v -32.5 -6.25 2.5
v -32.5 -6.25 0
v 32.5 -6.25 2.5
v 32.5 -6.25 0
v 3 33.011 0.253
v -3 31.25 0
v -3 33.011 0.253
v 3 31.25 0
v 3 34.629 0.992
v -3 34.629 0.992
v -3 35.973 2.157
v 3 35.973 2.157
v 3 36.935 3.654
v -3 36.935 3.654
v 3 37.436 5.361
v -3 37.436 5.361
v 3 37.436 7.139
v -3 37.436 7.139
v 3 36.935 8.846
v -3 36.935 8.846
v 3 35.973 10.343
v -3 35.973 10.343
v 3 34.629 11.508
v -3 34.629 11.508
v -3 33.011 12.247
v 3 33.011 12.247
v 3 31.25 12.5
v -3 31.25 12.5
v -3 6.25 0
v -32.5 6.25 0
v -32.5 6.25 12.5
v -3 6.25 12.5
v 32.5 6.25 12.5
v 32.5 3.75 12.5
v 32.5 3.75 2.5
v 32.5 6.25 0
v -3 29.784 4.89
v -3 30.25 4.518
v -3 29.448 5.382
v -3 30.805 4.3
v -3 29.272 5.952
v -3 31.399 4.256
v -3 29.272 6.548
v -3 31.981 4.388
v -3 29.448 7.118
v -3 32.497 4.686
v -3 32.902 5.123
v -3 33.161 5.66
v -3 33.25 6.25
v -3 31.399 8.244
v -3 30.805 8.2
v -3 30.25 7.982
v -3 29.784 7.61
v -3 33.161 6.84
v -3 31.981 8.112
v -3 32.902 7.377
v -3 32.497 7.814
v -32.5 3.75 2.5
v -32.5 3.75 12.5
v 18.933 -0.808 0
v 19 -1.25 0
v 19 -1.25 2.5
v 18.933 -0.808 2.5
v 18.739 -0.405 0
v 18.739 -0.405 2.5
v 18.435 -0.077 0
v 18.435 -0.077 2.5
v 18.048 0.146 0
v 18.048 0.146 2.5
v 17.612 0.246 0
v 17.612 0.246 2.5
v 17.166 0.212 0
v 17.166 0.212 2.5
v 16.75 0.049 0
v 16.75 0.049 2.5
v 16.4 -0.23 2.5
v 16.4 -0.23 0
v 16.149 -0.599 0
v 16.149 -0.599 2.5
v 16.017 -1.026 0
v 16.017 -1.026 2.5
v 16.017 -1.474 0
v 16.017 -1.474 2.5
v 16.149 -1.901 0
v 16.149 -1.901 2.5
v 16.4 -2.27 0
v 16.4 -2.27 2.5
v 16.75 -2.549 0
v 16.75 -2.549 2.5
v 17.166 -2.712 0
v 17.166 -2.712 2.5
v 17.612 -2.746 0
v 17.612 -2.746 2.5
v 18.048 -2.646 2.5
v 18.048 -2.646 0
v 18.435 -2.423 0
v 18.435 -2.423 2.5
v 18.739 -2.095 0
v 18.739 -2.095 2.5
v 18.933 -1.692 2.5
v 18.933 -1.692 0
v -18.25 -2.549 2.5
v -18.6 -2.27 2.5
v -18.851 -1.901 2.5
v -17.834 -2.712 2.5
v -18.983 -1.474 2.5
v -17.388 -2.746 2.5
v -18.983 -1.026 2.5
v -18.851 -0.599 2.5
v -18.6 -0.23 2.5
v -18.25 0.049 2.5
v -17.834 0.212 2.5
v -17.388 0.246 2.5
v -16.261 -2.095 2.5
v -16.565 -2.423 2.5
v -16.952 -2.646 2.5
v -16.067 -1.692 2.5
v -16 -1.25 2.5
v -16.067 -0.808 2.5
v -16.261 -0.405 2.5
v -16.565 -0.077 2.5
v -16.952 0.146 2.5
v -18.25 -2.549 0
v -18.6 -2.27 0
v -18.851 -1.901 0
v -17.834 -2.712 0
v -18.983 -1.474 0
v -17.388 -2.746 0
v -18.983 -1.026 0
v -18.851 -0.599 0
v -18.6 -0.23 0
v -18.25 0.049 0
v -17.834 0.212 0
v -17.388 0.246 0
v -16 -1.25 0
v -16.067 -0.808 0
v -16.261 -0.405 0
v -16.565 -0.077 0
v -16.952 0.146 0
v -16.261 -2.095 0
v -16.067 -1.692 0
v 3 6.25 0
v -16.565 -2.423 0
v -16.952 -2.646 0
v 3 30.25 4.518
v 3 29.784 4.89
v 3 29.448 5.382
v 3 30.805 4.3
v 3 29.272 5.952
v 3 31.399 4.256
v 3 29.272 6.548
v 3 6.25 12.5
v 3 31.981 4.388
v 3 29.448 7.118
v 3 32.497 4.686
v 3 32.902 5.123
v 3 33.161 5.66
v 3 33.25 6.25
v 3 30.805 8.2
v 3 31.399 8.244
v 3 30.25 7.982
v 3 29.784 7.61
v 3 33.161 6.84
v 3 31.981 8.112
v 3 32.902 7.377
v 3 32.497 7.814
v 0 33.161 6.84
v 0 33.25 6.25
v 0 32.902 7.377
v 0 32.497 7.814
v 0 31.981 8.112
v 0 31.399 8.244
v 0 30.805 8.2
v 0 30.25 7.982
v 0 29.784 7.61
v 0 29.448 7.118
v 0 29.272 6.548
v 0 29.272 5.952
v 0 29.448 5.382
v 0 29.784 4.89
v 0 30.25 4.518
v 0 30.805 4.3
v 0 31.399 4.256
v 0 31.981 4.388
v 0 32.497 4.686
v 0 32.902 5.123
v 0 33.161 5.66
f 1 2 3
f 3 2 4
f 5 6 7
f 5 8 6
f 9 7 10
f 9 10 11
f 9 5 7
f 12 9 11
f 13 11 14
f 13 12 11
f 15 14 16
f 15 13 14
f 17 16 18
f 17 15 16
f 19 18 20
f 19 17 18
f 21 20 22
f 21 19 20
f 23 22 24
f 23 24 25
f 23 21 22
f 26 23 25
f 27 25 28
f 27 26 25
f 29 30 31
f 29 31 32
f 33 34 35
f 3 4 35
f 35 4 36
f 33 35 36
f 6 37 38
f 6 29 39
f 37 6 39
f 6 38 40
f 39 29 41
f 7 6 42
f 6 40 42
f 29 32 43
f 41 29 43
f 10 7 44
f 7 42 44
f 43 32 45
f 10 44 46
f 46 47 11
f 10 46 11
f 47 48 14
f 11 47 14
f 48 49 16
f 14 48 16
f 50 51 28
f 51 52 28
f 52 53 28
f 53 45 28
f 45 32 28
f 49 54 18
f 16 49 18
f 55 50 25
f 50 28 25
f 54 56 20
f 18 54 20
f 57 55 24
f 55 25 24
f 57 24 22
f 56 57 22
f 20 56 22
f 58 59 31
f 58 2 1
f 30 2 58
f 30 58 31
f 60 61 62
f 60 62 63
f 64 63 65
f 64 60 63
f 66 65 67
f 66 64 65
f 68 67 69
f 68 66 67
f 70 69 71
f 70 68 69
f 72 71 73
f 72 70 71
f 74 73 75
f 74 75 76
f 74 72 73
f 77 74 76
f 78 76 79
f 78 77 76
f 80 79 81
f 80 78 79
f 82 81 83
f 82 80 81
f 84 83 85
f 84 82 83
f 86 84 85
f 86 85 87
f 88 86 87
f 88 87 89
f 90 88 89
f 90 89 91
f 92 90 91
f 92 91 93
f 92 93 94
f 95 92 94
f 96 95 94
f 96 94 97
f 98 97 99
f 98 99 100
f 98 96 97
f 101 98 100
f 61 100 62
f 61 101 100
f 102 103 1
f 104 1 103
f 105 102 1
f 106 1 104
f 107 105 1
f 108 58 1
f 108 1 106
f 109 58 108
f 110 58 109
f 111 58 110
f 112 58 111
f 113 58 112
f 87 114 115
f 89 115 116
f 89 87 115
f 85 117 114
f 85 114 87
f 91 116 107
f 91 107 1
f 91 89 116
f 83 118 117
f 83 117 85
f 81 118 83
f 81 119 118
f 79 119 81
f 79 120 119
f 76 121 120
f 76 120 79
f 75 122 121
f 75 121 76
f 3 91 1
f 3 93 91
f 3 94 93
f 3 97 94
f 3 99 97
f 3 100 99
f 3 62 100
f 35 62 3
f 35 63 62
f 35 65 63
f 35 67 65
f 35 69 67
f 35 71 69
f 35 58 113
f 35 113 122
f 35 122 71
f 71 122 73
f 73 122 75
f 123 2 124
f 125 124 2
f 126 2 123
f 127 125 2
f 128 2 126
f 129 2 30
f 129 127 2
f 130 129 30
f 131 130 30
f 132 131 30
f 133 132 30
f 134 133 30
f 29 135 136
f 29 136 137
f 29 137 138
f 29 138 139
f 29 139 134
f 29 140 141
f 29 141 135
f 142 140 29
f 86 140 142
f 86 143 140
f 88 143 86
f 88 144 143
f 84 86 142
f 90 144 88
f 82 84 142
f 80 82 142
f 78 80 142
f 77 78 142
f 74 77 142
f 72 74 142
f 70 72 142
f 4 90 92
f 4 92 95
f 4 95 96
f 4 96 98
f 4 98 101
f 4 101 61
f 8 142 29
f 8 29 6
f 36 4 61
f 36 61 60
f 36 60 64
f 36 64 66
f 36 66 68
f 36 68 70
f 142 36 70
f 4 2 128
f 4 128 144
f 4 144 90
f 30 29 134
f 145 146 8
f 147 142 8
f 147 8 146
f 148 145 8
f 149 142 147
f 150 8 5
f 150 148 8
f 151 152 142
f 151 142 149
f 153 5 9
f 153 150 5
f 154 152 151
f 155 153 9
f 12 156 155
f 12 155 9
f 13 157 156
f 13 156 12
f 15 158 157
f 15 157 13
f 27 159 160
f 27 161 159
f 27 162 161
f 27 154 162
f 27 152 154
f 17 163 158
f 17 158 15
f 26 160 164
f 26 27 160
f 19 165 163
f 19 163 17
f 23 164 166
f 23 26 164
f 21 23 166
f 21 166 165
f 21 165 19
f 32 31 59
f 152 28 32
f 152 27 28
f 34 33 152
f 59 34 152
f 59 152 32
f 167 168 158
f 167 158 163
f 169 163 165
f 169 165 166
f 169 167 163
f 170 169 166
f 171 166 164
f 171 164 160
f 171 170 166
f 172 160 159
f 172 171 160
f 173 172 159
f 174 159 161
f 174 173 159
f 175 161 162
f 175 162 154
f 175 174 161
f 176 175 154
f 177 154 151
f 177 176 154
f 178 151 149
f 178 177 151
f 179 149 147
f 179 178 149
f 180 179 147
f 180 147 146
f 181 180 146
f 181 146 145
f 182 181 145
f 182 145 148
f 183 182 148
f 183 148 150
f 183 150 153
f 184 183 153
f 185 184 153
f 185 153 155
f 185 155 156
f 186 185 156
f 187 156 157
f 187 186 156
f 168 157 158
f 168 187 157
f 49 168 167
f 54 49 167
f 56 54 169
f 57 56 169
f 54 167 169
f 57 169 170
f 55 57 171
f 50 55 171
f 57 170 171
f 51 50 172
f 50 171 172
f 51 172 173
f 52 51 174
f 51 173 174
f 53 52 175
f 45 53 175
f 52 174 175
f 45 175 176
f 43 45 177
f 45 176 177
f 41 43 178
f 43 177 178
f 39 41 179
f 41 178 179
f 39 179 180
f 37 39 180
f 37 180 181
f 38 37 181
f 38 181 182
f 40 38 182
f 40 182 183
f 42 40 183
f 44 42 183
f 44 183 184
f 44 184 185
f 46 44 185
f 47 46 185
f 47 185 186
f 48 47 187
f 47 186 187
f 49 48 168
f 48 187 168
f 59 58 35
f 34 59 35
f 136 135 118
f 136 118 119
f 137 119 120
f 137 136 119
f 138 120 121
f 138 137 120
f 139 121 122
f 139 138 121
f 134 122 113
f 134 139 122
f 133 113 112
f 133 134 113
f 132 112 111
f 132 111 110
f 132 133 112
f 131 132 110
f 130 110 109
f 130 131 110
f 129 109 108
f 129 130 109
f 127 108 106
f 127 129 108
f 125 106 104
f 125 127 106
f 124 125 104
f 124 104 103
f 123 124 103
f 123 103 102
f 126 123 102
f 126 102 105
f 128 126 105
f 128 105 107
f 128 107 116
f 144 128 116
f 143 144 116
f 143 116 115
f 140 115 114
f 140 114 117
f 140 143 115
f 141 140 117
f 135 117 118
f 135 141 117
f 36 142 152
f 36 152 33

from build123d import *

# Parameters (mm, degrees)
F0_W          = 65
F0_H          = 12.5
F0_R          = 1.5
F1_DEPTH      = 2.5
F2_W          = 65
F2_H          = 2.5
F3_DEPTH      = 10
F4_R          = 2
F5_DEPTH      = 3
F5_DEPTH_BACK = 3


with BuildPart() as f1:
    # F0 (on Top) → F1 (new body)
    with BuildSketch(Plane.XY):
        Rectangle(F0_W, F0_H)
        with Locations((-17.5, -1.25)):
            Circle(F0_R, mode=Mode.SUBTRACT)
        with Locations((17.5, -1.25)):
            Circle(F0_R, mode=Mode.SUBTRACT)
    extrude(amount=F1_DEPTH)

    # F2 (on face) → F3 (join)
    with BuildSketch(Plane.XY.offset(2.5)):
        with Locations((0, 5)):
            Rectangle(F2_W, F2_H)
    extrude(amount=F3_DEPTH)

    # F4 (on Right) → F5 (join, two sides)
    with BuildSketch(Plane.YZ) as f5_sk:
        with BuildLine():
            Line((6.25, 12.5), (6.25, 0))
            Line((6.25, 0), (31.25, 0))
            ThreePointArc((31.25, 0), (37.5, 6.25), (31.25, 12.5))
            Line((31.25, 12.5), (6.25, 12.5))
        make_face()
        with Locations((31.25, 6.25)):
            Circle(F4_R, mode=Mode.SUBTRACT)
    extrude(amount=F5_DEPTH)
    extrude(f5_sk.sketch, amount=-F5_DEPTH_BACK)


solid = f1.part
